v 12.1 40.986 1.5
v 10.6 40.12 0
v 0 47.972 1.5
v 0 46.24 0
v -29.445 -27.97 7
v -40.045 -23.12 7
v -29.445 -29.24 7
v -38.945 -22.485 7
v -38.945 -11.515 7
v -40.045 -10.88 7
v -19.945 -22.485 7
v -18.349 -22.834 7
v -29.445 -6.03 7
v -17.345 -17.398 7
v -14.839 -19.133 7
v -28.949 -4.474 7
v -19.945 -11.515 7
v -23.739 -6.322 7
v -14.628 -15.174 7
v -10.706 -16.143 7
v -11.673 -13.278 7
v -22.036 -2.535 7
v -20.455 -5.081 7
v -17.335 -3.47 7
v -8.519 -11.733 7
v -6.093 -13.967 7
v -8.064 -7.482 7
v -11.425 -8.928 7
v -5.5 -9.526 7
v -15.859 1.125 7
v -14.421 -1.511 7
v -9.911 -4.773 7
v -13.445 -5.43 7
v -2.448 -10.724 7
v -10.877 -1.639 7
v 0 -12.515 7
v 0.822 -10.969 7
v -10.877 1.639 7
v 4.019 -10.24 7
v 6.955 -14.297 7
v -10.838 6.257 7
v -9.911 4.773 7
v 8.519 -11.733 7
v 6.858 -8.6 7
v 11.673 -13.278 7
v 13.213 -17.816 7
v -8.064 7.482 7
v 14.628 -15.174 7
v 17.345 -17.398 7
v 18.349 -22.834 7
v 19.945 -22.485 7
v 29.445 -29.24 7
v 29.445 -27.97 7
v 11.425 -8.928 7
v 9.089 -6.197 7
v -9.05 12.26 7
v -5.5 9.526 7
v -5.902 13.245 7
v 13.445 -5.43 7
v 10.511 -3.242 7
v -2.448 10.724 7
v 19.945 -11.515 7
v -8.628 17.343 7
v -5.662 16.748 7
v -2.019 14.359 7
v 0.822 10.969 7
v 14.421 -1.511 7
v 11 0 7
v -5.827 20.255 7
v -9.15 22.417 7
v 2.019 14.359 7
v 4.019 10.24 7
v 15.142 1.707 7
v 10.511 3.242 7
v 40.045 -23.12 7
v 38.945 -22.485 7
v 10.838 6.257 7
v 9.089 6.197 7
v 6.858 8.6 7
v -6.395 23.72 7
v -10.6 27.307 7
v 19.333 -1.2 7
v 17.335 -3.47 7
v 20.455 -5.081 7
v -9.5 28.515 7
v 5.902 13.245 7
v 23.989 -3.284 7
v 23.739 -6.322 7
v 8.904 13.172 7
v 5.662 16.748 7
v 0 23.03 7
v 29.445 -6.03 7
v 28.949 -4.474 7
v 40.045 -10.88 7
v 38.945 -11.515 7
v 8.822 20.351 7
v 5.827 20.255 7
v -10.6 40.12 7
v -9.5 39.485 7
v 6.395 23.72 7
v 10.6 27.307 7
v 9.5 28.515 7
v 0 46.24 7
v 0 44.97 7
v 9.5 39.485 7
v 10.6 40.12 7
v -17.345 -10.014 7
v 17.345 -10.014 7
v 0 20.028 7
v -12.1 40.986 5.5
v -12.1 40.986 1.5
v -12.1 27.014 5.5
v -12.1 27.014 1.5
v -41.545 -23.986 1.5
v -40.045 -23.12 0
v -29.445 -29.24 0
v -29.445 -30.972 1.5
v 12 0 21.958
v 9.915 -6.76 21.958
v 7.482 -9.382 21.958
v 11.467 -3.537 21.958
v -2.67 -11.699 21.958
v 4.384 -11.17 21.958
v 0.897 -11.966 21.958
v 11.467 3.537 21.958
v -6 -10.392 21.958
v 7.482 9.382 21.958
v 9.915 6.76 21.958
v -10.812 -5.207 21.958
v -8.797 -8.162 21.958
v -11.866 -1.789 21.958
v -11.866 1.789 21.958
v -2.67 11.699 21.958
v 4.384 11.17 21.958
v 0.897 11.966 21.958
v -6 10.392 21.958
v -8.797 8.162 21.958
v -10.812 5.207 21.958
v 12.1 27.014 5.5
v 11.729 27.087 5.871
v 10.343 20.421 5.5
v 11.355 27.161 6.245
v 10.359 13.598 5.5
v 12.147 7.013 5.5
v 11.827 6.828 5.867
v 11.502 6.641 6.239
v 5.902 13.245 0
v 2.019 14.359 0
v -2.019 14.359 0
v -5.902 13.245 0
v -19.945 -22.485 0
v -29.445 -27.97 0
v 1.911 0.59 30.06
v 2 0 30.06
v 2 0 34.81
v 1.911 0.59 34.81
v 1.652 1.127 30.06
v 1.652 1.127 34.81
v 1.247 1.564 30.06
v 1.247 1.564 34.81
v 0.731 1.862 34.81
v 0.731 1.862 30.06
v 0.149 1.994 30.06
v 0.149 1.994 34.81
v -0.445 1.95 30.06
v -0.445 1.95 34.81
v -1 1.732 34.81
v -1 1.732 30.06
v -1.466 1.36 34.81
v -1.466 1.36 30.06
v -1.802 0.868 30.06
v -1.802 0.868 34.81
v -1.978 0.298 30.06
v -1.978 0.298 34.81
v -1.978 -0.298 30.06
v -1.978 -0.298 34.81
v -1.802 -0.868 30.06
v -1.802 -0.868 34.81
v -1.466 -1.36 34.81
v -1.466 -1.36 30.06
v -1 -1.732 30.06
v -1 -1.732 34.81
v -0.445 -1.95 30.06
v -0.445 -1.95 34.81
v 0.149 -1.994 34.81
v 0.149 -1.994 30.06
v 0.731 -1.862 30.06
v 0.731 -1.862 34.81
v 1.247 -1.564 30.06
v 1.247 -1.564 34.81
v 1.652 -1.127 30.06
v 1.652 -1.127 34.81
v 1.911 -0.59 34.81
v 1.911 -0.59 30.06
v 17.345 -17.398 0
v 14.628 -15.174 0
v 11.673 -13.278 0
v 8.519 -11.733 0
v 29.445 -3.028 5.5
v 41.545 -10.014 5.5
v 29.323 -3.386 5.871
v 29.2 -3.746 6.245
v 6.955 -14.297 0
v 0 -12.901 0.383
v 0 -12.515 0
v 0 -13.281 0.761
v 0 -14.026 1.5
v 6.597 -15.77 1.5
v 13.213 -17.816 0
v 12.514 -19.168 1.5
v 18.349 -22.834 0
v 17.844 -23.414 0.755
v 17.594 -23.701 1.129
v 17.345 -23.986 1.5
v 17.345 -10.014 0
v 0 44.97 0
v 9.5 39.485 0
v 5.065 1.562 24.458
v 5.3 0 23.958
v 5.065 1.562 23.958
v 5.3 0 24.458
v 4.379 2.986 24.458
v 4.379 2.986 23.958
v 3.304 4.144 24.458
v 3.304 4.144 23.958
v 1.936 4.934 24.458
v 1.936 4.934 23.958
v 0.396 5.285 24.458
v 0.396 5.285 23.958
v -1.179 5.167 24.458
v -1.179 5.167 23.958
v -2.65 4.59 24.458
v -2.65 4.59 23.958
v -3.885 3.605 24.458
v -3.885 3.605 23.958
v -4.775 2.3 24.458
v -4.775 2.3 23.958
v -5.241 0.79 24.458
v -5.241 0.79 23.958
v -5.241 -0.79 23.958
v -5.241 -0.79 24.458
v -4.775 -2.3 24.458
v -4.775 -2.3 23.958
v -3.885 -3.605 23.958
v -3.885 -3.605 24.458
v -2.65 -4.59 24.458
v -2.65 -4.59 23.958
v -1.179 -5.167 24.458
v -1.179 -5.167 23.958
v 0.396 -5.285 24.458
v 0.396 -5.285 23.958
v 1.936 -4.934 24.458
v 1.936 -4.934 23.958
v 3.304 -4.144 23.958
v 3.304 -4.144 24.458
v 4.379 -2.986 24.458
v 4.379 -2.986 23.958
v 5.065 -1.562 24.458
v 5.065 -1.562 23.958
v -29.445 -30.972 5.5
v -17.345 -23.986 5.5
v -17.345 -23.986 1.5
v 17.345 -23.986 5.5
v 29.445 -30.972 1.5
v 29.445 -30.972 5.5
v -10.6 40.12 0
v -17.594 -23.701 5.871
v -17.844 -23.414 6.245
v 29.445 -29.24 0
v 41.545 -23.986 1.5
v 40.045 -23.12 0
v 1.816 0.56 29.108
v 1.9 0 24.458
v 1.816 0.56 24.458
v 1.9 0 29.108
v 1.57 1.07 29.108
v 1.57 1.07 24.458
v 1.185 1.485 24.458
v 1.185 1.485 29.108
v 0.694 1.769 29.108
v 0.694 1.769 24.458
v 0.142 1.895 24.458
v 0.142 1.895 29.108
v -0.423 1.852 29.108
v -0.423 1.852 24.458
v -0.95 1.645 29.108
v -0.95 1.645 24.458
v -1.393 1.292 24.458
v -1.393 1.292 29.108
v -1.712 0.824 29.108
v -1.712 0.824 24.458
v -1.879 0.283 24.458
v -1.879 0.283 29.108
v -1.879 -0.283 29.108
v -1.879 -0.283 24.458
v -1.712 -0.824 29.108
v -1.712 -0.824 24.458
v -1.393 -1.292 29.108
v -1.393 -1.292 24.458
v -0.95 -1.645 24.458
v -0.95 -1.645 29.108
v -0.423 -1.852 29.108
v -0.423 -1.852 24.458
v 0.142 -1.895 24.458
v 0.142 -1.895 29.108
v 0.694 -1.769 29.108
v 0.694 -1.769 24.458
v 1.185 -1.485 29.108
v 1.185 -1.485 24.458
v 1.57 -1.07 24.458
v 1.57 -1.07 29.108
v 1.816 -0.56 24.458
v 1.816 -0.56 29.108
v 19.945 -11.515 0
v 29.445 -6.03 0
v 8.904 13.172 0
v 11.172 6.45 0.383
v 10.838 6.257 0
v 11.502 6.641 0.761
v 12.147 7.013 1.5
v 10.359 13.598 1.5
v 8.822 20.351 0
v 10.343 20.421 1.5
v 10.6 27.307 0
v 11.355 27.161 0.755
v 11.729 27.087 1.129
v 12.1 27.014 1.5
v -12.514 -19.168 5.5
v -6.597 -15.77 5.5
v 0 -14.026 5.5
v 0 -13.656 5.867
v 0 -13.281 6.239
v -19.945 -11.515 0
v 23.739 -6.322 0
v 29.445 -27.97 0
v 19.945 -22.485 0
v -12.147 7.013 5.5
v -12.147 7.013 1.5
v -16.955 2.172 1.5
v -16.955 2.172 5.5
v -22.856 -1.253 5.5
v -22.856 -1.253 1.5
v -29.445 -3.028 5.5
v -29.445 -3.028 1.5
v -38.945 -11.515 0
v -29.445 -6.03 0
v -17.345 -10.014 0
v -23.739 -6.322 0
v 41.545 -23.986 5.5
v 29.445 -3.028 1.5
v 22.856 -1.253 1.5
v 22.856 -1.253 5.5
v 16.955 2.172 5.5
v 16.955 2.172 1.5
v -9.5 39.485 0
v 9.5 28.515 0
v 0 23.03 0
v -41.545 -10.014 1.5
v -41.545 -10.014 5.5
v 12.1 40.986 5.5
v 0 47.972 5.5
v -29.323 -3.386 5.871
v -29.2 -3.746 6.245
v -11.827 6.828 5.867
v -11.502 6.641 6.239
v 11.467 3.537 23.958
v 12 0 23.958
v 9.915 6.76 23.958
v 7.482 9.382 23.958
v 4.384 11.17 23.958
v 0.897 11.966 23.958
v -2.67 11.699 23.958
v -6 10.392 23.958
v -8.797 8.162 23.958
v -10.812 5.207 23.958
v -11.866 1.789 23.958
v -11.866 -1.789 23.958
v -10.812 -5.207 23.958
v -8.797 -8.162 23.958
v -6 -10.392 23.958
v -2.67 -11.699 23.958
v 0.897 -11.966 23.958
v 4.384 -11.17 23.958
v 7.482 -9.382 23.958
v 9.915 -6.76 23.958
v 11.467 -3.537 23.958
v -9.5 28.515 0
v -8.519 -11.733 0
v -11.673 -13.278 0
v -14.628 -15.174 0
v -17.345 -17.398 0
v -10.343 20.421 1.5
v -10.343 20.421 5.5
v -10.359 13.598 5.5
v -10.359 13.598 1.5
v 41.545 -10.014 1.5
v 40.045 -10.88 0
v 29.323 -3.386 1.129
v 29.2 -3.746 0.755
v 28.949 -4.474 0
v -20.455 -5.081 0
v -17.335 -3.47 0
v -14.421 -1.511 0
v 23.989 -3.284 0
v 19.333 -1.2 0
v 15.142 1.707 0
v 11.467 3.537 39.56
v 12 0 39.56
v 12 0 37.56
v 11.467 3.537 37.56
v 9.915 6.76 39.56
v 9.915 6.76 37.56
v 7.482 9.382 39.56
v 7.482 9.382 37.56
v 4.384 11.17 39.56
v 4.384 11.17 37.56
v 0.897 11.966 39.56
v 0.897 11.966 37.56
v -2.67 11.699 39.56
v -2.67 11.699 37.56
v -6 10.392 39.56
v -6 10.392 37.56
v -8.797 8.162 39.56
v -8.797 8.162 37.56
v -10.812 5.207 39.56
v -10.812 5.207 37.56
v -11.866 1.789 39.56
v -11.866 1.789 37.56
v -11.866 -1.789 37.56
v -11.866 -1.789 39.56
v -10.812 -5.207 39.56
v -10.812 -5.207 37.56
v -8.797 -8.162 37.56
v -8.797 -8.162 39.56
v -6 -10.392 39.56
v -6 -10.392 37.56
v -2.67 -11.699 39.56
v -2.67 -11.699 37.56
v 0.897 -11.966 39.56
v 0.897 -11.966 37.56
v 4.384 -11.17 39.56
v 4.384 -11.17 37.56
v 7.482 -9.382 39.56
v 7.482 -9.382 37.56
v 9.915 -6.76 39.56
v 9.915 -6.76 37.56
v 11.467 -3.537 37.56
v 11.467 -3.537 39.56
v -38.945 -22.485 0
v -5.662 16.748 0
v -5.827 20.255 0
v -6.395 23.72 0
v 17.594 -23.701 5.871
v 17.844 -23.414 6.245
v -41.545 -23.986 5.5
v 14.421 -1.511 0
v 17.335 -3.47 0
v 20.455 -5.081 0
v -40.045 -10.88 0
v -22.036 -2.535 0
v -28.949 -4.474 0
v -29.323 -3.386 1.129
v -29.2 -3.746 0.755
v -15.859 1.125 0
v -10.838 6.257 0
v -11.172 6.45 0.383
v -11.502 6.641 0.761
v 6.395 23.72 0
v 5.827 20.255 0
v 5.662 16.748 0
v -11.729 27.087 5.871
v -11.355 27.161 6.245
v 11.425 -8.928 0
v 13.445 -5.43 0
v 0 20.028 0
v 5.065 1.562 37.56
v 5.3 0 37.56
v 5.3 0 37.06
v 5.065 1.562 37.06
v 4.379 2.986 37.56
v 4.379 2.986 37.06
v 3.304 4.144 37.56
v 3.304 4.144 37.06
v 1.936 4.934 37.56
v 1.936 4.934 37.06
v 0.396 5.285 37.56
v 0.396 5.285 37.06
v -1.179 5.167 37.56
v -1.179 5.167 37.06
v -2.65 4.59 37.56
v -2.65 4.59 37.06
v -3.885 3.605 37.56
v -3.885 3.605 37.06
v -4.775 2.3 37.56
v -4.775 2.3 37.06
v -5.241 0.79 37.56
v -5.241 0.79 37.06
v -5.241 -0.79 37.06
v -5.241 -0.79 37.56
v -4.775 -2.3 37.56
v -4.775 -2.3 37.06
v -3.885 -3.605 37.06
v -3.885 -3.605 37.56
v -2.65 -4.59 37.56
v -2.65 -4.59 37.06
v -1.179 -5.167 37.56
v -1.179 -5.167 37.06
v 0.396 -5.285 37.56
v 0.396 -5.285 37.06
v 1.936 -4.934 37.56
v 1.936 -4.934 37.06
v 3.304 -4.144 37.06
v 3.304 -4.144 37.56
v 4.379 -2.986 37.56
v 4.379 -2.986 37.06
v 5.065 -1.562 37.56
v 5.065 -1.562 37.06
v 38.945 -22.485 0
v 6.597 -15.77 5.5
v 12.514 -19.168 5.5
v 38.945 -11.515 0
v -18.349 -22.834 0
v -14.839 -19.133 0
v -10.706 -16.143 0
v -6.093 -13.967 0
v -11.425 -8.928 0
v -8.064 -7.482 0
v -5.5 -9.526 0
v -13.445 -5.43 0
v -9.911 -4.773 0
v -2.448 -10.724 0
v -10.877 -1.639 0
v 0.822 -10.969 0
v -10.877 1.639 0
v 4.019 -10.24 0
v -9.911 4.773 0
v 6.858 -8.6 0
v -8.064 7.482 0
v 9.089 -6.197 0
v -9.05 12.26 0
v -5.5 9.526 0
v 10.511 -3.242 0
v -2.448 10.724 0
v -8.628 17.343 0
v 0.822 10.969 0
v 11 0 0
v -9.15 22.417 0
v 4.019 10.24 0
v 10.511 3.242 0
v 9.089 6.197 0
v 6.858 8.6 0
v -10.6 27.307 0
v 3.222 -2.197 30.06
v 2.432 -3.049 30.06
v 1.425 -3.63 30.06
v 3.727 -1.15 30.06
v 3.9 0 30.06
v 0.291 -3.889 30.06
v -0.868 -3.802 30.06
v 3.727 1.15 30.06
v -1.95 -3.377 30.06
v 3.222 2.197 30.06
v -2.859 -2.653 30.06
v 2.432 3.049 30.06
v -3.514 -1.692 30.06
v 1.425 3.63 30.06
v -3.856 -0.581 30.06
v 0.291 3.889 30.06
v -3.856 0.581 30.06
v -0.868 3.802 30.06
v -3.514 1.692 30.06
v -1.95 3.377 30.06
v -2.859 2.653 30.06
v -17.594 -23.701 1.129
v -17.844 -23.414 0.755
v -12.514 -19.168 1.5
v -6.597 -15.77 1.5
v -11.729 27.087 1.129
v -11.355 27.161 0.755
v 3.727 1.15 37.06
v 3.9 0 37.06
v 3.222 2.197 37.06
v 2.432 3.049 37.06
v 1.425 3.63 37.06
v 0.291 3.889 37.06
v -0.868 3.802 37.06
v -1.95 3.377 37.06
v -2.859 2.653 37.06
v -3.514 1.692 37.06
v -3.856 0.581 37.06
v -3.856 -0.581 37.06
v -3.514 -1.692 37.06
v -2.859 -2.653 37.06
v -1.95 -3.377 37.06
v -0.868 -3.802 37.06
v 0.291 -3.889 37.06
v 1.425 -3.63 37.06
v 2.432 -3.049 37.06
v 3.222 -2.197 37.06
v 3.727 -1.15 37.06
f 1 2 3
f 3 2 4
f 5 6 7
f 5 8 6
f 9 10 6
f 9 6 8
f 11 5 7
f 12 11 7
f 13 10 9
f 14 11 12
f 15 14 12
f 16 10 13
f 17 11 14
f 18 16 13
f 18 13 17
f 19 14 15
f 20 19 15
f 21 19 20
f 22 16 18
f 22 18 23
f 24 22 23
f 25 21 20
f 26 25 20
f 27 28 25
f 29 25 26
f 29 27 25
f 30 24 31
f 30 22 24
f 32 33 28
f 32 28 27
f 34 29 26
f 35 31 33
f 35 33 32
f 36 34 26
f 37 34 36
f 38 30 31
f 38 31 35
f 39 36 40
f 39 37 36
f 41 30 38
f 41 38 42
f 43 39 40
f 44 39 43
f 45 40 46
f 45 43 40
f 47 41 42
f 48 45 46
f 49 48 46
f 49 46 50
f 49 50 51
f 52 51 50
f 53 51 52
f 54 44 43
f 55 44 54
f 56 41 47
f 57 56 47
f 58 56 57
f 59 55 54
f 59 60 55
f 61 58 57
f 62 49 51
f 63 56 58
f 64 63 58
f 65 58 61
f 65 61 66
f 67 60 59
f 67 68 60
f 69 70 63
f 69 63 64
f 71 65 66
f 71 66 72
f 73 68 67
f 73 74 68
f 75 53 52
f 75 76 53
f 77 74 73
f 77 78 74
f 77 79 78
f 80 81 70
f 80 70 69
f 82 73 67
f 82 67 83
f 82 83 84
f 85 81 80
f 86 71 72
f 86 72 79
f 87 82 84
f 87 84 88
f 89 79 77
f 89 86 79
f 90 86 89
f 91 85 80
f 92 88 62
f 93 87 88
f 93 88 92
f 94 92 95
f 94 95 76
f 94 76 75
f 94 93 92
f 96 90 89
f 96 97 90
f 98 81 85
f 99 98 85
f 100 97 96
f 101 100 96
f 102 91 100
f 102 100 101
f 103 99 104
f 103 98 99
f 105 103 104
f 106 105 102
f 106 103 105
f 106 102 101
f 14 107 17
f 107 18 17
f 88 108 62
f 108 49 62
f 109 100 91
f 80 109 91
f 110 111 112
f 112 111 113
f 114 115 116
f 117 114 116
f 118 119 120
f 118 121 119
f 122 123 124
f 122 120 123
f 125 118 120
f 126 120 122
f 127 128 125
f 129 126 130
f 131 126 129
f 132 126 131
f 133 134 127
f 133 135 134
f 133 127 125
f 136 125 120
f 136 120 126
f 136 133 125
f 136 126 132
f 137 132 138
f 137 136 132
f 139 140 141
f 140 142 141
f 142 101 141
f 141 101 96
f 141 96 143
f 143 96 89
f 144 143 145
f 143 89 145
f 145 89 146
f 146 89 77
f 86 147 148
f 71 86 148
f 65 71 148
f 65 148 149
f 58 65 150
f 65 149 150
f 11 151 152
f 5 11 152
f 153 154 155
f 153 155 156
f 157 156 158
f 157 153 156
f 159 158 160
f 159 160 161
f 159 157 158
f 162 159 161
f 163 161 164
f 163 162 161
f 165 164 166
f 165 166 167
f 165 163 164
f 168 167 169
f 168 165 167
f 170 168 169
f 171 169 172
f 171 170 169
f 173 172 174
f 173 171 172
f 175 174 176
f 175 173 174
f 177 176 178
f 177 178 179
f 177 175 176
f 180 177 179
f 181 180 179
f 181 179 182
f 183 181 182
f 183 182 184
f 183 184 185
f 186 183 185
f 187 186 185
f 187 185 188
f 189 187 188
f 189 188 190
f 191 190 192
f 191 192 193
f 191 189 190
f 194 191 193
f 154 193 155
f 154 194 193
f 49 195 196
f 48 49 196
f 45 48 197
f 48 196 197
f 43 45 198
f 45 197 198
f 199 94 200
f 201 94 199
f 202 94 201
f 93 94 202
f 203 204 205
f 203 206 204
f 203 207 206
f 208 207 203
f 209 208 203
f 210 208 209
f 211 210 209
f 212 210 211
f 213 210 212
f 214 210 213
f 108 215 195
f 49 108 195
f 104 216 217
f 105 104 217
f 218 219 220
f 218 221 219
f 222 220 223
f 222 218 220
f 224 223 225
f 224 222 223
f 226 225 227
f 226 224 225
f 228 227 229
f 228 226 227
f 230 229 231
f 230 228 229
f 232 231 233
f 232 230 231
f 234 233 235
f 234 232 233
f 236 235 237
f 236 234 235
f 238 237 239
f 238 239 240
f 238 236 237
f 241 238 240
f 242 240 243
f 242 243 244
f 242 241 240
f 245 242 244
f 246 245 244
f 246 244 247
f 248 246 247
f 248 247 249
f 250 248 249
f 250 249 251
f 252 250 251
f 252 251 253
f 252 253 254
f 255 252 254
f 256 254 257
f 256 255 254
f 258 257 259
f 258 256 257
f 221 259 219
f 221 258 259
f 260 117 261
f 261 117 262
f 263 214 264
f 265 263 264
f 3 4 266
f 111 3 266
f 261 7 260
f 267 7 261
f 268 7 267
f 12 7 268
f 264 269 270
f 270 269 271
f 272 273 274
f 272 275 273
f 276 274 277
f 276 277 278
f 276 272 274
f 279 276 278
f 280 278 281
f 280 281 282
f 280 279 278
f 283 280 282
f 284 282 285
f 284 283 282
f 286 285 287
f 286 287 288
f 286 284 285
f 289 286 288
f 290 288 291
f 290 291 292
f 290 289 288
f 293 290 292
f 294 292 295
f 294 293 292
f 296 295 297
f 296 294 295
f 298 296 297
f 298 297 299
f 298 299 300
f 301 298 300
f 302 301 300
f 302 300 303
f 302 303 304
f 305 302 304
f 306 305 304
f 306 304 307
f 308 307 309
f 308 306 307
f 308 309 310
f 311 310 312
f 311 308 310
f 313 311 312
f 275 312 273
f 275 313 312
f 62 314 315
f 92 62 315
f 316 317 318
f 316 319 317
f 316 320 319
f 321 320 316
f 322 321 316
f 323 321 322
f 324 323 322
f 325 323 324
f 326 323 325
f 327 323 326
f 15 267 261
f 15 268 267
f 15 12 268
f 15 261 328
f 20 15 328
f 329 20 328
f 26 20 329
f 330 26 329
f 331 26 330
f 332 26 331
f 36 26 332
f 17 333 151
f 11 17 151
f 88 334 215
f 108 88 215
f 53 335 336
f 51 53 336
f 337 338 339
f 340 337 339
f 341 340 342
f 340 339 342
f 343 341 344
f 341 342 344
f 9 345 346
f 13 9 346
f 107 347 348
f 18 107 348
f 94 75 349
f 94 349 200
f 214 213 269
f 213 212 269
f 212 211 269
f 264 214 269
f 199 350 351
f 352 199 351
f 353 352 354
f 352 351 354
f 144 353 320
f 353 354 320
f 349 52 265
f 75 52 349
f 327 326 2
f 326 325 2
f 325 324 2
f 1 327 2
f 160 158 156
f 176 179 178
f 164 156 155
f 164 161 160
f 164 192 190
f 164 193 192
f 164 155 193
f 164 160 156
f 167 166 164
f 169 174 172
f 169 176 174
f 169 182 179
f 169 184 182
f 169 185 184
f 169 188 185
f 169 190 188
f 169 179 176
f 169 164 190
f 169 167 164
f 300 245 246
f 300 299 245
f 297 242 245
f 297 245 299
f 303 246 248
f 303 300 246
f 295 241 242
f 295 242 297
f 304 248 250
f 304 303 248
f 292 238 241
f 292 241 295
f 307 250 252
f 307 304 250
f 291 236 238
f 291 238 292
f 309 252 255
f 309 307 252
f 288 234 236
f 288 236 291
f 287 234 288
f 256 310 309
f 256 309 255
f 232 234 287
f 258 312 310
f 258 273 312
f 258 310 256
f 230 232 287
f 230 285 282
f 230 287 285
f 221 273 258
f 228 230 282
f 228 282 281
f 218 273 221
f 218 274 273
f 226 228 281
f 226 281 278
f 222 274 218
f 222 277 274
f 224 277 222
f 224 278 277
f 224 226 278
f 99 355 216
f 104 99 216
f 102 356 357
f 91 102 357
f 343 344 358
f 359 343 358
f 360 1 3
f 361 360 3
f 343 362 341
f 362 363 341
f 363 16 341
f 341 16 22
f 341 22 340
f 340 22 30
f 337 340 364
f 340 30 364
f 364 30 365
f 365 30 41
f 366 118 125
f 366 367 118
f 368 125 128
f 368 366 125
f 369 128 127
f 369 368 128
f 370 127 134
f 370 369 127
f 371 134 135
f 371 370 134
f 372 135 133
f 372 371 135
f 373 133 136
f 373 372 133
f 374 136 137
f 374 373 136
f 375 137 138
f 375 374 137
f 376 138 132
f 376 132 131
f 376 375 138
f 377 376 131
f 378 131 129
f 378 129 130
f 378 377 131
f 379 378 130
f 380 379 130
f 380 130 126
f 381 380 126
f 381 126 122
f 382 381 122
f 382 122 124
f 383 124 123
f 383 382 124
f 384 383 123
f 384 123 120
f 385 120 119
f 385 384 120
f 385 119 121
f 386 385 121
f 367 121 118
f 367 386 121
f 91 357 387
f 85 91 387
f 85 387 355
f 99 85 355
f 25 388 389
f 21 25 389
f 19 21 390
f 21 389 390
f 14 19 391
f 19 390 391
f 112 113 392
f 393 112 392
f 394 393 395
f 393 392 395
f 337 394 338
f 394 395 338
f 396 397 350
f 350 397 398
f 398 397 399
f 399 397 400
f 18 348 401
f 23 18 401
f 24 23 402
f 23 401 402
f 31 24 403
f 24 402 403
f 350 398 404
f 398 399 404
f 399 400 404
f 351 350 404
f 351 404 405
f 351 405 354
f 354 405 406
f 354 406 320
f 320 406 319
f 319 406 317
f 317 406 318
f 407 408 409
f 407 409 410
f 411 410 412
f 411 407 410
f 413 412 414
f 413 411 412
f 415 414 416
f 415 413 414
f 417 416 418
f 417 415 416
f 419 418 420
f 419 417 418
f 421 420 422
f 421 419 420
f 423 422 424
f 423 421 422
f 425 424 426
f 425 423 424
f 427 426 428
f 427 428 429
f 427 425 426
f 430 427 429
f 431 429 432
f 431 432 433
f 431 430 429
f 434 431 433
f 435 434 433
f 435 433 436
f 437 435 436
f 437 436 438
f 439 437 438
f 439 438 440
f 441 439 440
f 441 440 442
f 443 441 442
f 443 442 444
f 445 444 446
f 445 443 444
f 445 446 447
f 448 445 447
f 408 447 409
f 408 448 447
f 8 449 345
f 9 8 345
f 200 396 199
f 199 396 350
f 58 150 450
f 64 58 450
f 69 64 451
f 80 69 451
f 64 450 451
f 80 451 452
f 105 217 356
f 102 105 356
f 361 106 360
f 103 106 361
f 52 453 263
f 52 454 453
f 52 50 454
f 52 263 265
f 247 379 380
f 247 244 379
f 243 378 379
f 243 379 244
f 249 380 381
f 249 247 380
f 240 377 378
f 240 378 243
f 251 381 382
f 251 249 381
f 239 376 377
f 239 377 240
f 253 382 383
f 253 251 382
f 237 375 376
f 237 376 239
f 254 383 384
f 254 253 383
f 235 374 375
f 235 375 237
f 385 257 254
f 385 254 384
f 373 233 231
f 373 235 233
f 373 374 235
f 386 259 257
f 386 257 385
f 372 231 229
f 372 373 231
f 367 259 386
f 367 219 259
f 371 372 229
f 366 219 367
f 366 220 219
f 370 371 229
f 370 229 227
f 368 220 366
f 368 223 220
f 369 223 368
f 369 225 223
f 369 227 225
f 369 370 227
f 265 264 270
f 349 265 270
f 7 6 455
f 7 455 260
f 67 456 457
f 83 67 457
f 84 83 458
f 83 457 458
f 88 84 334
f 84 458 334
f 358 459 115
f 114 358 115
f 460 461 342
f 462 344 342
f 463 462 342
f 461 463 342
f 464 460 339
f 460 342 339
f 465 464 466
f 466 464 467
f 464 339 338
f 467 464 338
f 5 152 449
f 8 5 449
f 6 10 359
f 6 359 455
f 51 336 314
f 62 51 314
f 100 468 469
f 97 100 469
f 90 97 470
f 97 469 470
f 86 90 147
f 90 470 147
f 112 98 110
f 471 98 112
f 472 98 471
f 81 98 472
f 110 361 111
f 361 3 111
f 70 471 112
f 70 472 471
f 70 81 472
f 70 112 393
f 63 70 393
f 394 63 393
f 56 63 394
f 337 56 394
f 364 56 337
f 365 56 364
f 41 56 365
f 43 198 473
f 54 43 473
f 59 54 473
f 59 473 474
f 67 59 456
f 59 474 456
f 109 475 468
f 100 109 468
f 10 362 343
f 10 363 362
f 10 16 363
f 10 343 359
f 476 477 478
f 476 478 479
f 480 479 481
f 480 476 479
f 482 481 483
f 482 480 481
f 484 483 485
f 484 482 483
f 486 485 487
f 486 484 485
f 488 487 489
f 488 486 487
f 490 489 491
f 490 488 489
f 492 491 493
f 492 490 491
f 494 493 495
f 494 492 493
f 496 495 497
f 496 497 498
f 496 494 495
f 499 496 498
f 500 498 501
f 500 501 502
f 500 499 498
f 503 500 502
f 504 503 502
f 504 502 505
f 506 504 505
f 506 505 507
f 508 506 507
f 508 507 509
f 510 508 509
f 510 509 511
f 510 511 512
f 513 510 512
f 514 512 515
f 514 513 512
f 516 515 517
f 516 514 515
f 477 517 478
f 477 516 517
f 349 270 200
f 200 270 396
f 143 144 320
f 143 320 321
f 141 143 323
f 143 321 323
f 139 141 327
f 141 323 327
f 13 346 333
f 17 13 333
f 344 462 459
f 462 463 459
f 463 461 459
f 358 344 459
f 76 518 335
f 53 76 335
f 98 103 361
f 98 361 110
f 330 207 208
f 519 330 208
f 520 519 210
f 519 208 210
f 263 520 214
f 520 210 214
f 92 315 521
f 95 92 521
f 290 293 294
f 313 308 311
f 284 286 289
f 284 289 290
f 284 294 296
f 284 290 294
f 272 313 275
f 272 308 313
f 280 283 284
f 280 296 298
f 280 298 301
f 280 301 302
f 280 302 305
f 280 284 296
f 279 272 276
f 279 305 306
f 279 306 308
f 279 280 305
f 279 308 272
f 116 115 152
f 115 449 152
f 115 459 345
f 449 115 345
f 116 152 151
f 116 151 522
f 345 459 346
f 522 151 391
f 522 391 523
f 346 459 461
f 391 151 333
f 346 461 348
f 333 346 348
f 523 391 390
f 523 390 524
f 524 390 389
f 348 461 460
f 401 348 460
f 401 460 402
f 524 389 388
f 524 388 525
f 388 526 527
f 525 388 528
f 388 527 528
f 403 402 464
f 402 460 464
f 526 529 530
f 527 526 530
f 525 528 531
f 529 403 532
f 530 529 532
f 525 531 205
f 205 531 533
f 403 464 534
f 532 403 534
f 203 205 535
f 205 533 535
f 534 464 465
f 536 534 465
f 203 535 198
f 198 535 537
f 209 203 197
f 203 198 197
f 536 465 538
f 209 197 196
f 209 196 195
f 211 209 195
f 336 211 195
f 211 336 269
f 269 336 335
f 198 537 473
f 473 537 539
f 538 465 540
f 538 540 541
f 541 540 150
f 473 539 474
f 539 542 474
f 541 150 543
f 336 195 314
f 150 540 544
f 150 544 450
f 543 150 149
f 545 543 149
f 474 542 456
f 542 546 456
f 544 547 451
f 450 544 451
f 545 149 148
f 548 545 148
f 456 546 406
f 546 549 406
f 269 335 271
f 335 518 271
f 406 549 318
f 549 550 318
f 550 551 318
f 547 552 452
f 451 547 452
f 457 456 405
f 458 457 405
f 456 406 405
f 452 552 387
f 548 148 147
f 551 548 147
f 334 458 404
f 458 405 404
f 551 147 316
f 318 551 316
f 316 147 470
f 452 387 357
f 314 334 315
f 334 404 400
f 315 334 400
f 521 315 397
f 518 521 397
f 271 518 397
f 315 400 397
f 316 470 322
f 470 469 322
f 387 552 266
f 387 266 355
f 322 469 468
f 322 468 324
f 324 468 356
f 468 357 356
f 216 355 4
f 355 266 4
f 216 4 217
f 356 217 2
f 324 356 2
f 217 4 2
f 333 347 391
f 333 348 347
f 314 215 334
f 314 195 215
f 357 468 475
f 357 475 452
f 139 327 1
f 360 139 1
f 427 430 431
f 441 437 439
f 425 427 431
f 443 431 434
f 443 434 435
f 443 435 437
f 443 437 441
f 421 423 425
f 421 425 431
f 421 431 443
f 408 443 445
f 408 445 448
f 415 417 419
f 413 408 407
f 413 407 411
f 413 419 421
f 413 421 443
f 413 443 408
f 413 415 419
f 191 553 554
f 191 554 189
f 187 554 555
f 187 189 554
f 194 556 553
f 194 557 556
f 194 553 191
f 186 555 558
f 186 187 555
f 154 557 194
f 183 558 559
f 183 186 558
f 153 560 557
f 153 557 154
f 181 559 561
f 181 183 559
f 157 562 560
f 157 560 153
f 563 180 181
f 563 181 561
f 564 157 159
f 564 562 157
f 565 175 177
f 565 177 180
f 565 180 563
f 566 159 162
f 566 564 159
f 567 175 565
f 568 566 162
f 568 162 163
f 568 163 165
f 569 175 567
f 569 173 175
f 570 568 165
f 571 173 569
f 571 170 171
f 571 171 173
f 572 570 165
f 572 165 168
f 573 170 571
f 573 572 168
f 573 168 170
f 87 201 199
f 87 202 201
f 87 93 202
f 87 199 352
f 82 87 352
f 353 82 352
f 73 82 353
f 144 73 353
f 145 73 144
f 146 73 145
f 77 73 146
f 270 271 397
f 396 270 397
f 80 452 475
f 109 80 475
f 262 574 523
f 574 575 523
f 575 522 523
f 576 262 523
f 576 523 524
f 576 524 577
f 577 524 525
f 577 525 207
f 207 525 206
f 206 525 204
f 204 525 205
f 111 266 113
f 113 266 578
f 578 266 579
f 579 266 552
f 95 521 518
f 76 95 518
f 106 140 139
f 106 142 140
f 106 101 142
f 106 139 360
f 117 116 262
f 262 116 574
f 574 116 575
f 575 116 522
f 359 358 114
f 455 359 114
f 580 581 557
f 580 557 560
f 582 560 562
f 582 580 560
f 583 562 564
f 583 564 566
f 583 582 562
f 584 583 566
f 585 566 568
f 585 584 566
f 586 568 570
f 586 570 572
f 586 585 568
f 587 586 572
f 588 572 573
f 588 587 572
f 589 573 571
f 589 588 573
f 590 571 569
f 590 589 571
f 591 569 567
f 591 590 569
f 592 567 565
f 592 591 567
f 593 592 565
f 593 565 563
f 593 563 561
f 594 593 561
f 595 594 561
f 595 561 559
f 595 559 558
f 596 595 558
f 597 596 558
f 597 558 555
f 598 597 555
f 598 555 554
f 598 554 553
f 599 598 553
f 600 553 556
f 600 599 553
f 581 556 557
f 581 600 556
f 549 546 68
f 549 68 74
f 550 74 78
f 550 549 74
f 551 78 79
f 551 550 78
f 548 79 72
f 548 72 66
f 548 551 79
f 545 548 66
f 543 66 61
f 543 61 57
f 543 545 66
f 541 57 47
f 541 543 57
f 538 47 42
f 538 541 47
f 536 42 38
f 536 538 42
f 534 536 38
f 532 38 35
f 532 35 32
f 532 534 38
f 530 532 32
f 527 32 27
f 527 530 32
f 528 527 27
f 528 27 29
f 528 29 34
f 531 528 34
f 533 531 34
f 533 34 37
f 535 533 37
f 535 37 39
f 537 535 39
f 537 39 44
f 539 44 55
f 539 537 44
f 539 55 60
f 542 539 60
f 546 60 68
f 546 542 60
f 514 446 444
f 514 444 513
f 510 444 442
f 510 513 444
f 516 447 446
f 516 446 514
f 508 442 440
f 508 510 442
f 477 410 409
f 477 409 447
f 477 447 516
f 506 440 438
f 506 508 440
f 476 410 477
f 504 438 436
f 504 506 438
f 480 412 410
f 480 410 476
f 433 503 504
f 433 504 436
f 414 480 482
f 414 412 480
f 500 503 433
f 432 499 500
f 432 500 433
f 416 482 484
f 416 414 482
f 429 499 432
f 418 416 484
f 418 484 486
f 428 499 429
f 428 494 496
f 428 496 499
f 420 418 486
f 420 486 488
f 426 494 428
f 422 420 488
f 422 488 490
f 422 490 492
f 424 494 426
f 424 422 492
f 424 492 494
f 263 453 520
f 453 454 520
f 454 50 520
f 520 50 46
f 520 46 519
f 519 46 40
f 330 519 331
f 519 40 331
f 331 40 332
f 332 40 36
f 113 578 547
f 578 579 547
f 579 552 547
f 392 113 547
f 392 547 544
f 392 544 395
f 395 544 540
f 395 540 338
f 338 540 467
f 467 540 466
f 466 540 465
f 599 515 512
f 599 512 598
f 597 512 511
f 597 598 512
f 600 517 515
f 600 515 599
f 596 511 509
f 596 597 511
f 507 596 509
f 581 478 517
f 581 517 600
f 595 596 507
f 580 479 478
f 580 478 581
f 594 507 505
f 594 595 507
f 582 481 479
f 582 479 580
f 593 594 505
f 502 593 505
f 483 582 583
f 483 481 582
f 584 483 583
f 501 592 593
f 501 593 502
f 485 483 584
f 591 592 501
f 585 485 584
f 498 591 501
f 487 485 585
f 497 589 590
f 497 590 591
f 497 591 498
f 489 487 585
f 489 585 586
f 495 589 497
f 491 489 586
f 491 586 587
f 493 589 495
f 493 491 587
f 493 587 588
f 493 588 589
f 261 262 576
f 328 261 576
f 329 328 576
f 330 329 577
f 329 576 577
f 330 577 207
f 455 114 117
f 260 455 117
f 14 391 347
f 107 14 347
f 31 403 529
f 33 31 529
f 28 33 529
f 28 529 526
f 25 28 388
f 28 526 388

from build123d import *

# Parameters (mm, degrees)
F0_R        = 11
F1_DEPTH    = 7
F2_C1_SIZE  = 1.5
F2_C2_SIZE  = 1.5
F2_C3_SIZE  = 1.5
F2_C4_SIZE  = 1.5
F2_C5_SIZE  = 1.5
F2_C6_SIZE  = 1.5
F2_C7_SIZE  = 1.5
F2_C8_SIZE  = 1.5
F2_C9_SIZE  = 1.5
F2_C10_SIZE = 1.5
F2_C11_SIZE = 1.5
F2_C12_SIZE = 1.5
F2_C13_SIZE = 1.5
F2_C14_SIZE = 1.5
F2_C15_SIZE = 1.5
F2_C16_SIZE = 1.5
F2_C17_SIZE = 1.5
F2_C18_SIZE = 1.5
F2_C19_SIZE = 1.5
F2_C20_SIZE = 1.5
F2_C21_SIZE = 1.5
F2_C22_SIZE = 1.5
F2_C23_SIZE = 1.5
F2_C24_SIZE = 1.5
F2_C25_SIZE = 1.5
F2_C26_SIZE = 1.5
F2_C27_SIZE = 1.5
F2_C28_SIZE = 1.5
F2_C29_SIZE = 1.5
F2_C30_SIZE = 1.5
F2_C31_SIZE = 1.5
F2_C32_SIZE = 1.5
F2_C33_SIZE = 1.5
F2_C34_SIZE = 1.5
F2_C35_SIZE = 1.5
F2_C36_SIZE = 1.5


with BuildPart() as f1:
    # F0 (on Top) → F1 (new body)
    with BuildSketch(Plane.XY):
        with BuildLine():
            Line((-12.1000001989, 40.985938372), (-12.1000001989, 27.014061628))
            ThreePointArc((-12.1000001989, 27.014061628), (-10.1262410801, 17.0088965937), (-12.1471185409, 7.0131421595))
            ThreePointArc((-12.1471185409, 7.0131421595), (-19.7932570806, 0.2651337234), (-29.4448637287, -3.028123256))
            Line((-29.4448637287, -3.028123256), (-41.5448639275, -10.014061628))
            Line((-41.5448639275, -10.014061628), (-41.5448639275, -23.985938372))
            Line((-41.5448639275, -23.985938372), (-29.4448637287, -30.971876744))
            Line((-29.4448637287, -30.971876744), (-17.3448635298, -23.985938372))
            ThreePointArc((-17.3448635298, -23.985938372), (-9.6670160005, -17.2740303171), (0, -14.0262843189))
            ThreePointArc((0, -14.0262843189), (9.6670160005, -17.2740303171), (17.3448635298, -23.985938372))
            Line((17.3448635298, -23.985938372), (29.4448637287, -30.971876744))
            Line((29.4448637287, -30.971876744), (41.5448639275, -23.985938372))
            Line((41.5448639275, -23.985938372), (41.5448639275, -10.014061628))
            Line((41.5448639275, -10.014061628), (29.4448637287, -3.028123256))
            ThreePointArc((29.4448637287, -3.028123256), (19.7932570806, 0.2651337234), (12.1471185409, 7.0131421595))
            ThreePointArc((12.1471185409, 7.0131421595), (10.1262410801, 17.0088965937), (12.1000001989, 27.014061628))
            Line((12.1000001989, 27.014061628), (12.1000001989, 40.985938372))
            Line((12.1000001989, 40.985938372), (0, 47.971876744))
            Line((0, 47.971876744), (-12.1000001989, 40.985938372))
        make_face()
        Polygon((-29.4448637287, -27.9696551146), (-38.9448637287, -22.4848275573), (-38.9448637287, -11.5151724427), (-29.4448637287, -6.0303448854), (-19.9448637287, -11.5151724427), (-19.9448637287, -22.4848275573), align=None, mode=Mode.SUBTRACT)
        with BuildLine():
            Line((-17.3448635298, -17.39779537), (-17.3448635298, -10.014061628))
            Line((-17.3448635298, -10.014061628), (-23.7393645251, -6.322194757))
            ThreePointArc((-23.7393645251, -6.322194757), (-18.8718751166, -4.3202733927), (-14.4210197002, -1.5113539646))
            ThreePointArc((-14.4210197002, -1.5113539646), (-12.5573683549, -7.25), (-8.5193807775, -11.7332924266))
            ThreePointArc((-8.5193807775, -11.7332924266), (-13.1774040677, -14.1833865716), (-17.3448635298, -17.39779537))
        make_face(mode=Mode.SUBTRACT)
        Circle(F0_R, mode=Mode.SUBTRACT)
        Polygon((38.9448637287, -11.5151724427), (38.9448637287, -22.4848275573), (29.4448637287, -27.9696551146), (19.9448637287, -22.4848275573), (19.9448637287, -11.5151724427), (29.4448637287, -6.0303448854), align=None, mode=Mode.SUBTRACT)
        with BuildLine():
            Line((23.7393645251, -6.322194757), (17.3448635298, -10.014061628))
            Line((17.3448635298, -10.014061628), (17.3448635298, -17.39779537))
            ThreePointArc((17.3448635298, -17.39779537), (13.1774040677, -14.1833865716), (8.5193807775, -11.7332924266))
            ThreePointArc((8.5193807775, -11.7332924266), (12.5573683549, -7.25), (14.4210197002, -1.5113539646))
            ThreePointArc((14.4210197002, -1.5113539646), (18.8718751166, -4.3202733927), (23.7393645251, -6.322194757))
        make_face(mode=Mode.SUBTRACT)
        with BuildLine():
            ThreePointArc((6.3945009953, 23.719990127), (5.6944710489, 18.5036599644), (5.9016389227, 13.2446463911))
            ThreePointArc((5.9016389227, 13.2446463911), (0, 14.5), (-5.9016389227, 13.2446463911))
            ThreePointArc((-5.9016389227, 13.2446463911), (-5.6944710489, 18.5036599644), (-6.3945009953, 23.719990127))
            Line((-6.3945009953, 23.719990127), (0, 20.028123256))
            Line((0, 20.028123256), (6.3945009953, 23.719990127))
        make_face(mode=Mode.SUBTRACT)
        Polygon((9.5, 39.4848275573), (9.5, 28.5151724427), (0, 23.0303448854), (-9.5, 28.5151724427), (-9.5, 39.4848275573), (0, 44.9696551146), align=None, mode=Mode.SUBTRACT)
    extrude(amount=F1_DEPTH)

    # F2: chamfer of 1.5 on 36 edges, made by hand

    # F2_c1
    f2_c1_edges = [f1.edges().sort_by_distance(p)[0] for p in [
        (-12.1000001989, 34, 0),
    ]]
    chamfer(f2_c1_edges, length=F2_C1_SIZE)

    # F2_c2
    f2_c2_edges = [f1.edges().sort_by_distance(p)[0] for p in [
        (-12.1000001989, 34, 7),
    ]]
    chamfer(f2_c2_edges, length=F2_C2_SIZE)

    # F2_c3
    f2_c3_edges = [f1.edges().sort_by_distance(p)[0] for p in [
        (-10.2635253889, 14.3994277983, 0),
    ]]
    chamfer(f2_c3_edges, length=F2_C3_SIZE)

    # F2_c4
    f2_c4_edges = [f1.edges().sort_by_distance(p)[0] for p in [
        (-10.2635253889, 14.3994277983, 7),
    ]]
    chamfer(f2_c4_edges, length=F2_C4_SIZE)

    # F2_c5
    f2_c5_edges = [f1.edges().sort_by_distance(p)[0] for p in [
        (-19.7932570806, 0.2651337234, 0),
    ]]
    chamfer(f2_c5_edges, length=F2_C5_SIZE)

    # F2_c6
    f2_c6_edges = [f1.edges().sort_by_distance(p)[0] for p in [
        (-19.7932570806, 0.2651337234, 7),
    ]]
    chamfer(f2_c6_edges, length=F2_C6_SIZE)

    # F2_c7
    f2_c7_edges = [f1.edges().sort_by_distance(p)[0] for p in [
        (-36.9861521886, -7.3820881783, 0),
    ]]
    chamfer(f2_c7_edges, length=F2_C7_SIZE)

    # F2_c8
    f2_c8_edges = [f1.edges().sort_by_distance(p)[0] for p in [
        (-36.9861521886, -7.3820881783, 7),
    ]]
    chamfer(f2_c8_edges, length=F2_C8_SIZE)

    # F2_c9
    f2_c9_edges = [f1.edges().sort_by_distance(p)[0] for p in [
        (-41.5448639275, -17.8660254038, 0),
    ]]
    chamfer(f2_c9_edges, length=F2_C9_SIZE)

    # F2_c10
    f2_c10_edges = [f1.edges().sort_by_distance(p)[0] for p in [
        (-41.5448639275, -17.8660254038, 7),
    ]]
    chamfer(f2_c10_edges, length=F2_C10_SIZE)

    # F2_c11
    f2_c11_edges = [f1.edges().sort_by_distance(p)[0] for p in [
        (-34.7448638281, -27.9119202599, 0),
    ]]
    chamfer(f2_c11_edges, length=F2_C11_SIZE)

    # F2_c12
    f2_c12_edges = [f1.edges().sort_by_distance(p)[0] for p in [
        (-34.7448638281, -27.9119202599, 7),
    ]]
    chamfer(f2_c12_edges, length=F2_C12_SIZE)

    # F2_c13
    f2_c13_edges = [f1.edges().sort_by_distance(p)[0] for p in [
        (-22.6448636292, -27.0458948561, 0),
    ]]
    chamfer(f2_c13_edges, length=F2_C13_SIZE)

    # F2_c14
    f2_c14_edges = [f1.edges().sort_by_distance(p)[0] for p in [
        (-22.6448636292, -27.0458948561, 7),
    ]]
    chamfer(f2_c14_edges, length=F2_C14_SIZE)

    # F2_c15
    f2_c15_edges = [f1.edges().sort_by_distance(p)[0] for p in [
        (-7.3385075789, -16.0881876183, 0),
    ]]
    chamfer(f2_c15_edges, length=F2_C15_SIZE)

    # F2_c16
    f2_c16_edges = [f1.edges().sort_by_distance(p)[0] for p in [
        (-7.3385075789, -16.0881876183, 7),
    ]]
    chamfer(f2_c16_edges, length=F2_C16_SIZE)

    # F2_c17
    f2_c17_edges = [f1.edges().sort_by_distance(p)[0] for p in [
        (9.6670160005, -17.2740303171, 0),
    ]]
    chamfer(f2_c17_edges, length=F2_C17_SIZE)

    # F2_c18
    f2_c18_edges = [f1.edges().sort_by_distance(p)[0] for p in [
        (9.6670160005, -17.2740303171, 7),
    ]]
    chamfer(f2_c18_edges, length=F2_C18_SIZE)

    # F2_c19
    f2_c19_edges = [f1.edges().sort_by_distance(p)[0] for p in [
        (24.8861519897, -28.3399032944, 0),
    ]]
    chamfer(f2_c19_edges, length=F2_C19_SIZE)

    # F2_c20
    f2_c20_edges = [f1.edges().sort_by_distance(p)[0] for p in [
        (24.8861519897, -28.3399032944, 7),
    ]]
    chamfer(f2_c20_edges, length=F2_C20_SIZE)

    # F2_c21
    f2_c21_edges = [f1.edges().sort_by_distance(p)[0] for p in [
        (36.2448638281, -27.0458948561, 0),
    ]]
    chamfer(f2_c21_edges, length=F2_C21_SIZE)

    # F2_c22
    f2_c22_edges = [f1.edges().sort_by_distance(p)[0] for p in [
        (36.2448638281, -27.0458948561, 7),
    ]]
    chamfer(f2_c22_edges, length=F2_C22_SIZE)

    # F2_c23
    f2_c23_edges = [f1.edges().sort_by_distance(p)[0] for p in [
        (41.5448639275, -16.1339745962, 0),
    ]]
    chamfer(f2_c23_edges, length=F2_C23_SIZE)

    # F2_c24
    f2_c24_edges = [f1.edges().sort_by_distance(p)[0] for p in [
        (41.5448639275, -16.1339745962, 7),
    ]]
    chamfer(f2_c24_edges, length=F2_C24_SIZE)

    # F2_c25
    f2_c25_edges = [f1.edges().sort_by_distance(p)[0] for p in [
        (34.7448638281, -6.0880797401, 0),
    ]]
    chamfer(f2_c25_edges, length=F2_C25_SIZE)

    # F2_c26
    f2_c26_edges = [f1.edges().sort_by_distance(p)[0] for p in [
        (34.7448638281, -6.0880797401, 7),
    ]]
    chamfer(f2_c26_edges, length=F2_C26_SIZE)

    # F2_c27
    f2_c27_edges = [f1.edges().sort_by_distance(p)[0] for p in [
        (17.6020329678, 1.68875982, 0),
    ]]
    chamfer(f2_c27_edges, length=F2_C27_SIZE)

    # F2_c28
    f2_c28_edges = [f1.edges().sort_by_distance(p)[0] for p in [
        (17.6020329678, 1.68875982, 7),
    ]]
    chamfer(f2_c28_edges, length=F2_C28_SIZE)

    # F2_c29
    f2_c29_edges = [f1.edges().sort_by_distance(p)[0] for p in [
        (10.1262410801, 17.0088965937, 0),
    ]]
    chamfer(f2_c29_edges, length=F2_C29_SIZE)

    # F2_c30
    f2_c30_edges = [f1.edges().sort_by_distance(p)[0] for p in [
        (10.1262410801, 17.0088965937, 7),
    ]]
    chamfer(f2_c30_edges, length=F2_C30_SIZE)

    # F2_c31
    f2_c31_edges = [f1.edges().sort_by_distance(p)[0] for p in [
        (12.1000001989, 35.7219914727, 0),
    ]]
    chamfer(f2_c31_edges, length=F2_C31_SIZE)

    # F2_c32
    f2_c32_edges = [f1.edges().sort_by_distance(p)[0] for p in [
        (12.1000001989, 35.7219914727, 7),
    ]]
    chamfer(f2_c32_edges, length=F2_C32_SIZE)

    # F2_c33
    f2_c33_edges = [f1.edges().sort_by_distance(p)[0] for p in [
        (5.3000000994, 44.9119202599, 0),
    ]]
    chamfer(f2_c33_edges, length=F2_C33_SIZE)

    # F2_c34
    f2_c34_edges = [f1.edges().sort_by_distance(p)[0] for p in [
        (5.3000000994, 44.9119202599, 7),
    ]]
    chamfer(f2_c34_edges, length=F2_C34_SIZE)

    # F2_c35
    f2_c35_edges = [f1.edges().sort_by_distance(p)[0] for p in [
        (-6.0500000994, 44.478907558, 0),
    ]]
    chamfer(f2_c35_edges, length=F2_C35_SIZE)

    # F2_c36
    f2_c36_edges = [f1.edges().sort_by_distance(p)[0] for p in [
        (-6.0500000994, 44.478907558, 7),
    ]]
    chamfer(f2_c36_edges, length=F2_C36_SIZE)


with BuildPart() as f4:
    # F3 (on Front) → F4 (revolve)
    with BuildSketch(Plane.XZ):
        Polygon((12, 37.5604808674), (12, 39.5604808674), (0, 39.5604808674), (0, 38.3482346942), (0, 34.8104808674), (2, 34.8104808674), (2, 30.0604808674), (3.9, 30.0604808674), (3.9, 37.0604808674), (5.3, 37.0604808674), (5.3, 37.5604808674), align=None)
    revolve(axis=Axis((0, 0, 36.5793577808), (0, 0, 1)))

    # F3 (on Front) → F5 (revolve)
    with BuildSketch(Plane.XZ):
        Polygon((12, 37.5604808674), (12, 39.5604808674), (0, 39.5604808674), (0, 38.3482346942), (0, 34.8104808674), (2, 34.8104808674), (2, 30.0604808674), (3.9, 30.0604808674), (3.9, 37.0604808674), (5.3, 37.0604808674), (5.3, 37.5604808674), align=None)
    revolve(axis=Axis((0, 0, 30.0604808674), (0, 0, 1)))


with BuildPart() as f5:
    # F3 (on Front) → F5, piece 2 (revolve)
    with BuildSketch(Plane.XZ):
        Polygon((1.9, 29.1078351825), (0, 29.1078351825), (0, 21.9578351825), (12, 21.9578351825), (12, 23.9578351825), (5.3, 23.9578351825), (5.3, 24.4578351825), (1.9, 24.4578351825), align=None)
    revolve(axis=Axis((0, 0, 30.0604808674), (0, 0, 1)))


solid = Compound([f1.part, f4.part, f5.part])
